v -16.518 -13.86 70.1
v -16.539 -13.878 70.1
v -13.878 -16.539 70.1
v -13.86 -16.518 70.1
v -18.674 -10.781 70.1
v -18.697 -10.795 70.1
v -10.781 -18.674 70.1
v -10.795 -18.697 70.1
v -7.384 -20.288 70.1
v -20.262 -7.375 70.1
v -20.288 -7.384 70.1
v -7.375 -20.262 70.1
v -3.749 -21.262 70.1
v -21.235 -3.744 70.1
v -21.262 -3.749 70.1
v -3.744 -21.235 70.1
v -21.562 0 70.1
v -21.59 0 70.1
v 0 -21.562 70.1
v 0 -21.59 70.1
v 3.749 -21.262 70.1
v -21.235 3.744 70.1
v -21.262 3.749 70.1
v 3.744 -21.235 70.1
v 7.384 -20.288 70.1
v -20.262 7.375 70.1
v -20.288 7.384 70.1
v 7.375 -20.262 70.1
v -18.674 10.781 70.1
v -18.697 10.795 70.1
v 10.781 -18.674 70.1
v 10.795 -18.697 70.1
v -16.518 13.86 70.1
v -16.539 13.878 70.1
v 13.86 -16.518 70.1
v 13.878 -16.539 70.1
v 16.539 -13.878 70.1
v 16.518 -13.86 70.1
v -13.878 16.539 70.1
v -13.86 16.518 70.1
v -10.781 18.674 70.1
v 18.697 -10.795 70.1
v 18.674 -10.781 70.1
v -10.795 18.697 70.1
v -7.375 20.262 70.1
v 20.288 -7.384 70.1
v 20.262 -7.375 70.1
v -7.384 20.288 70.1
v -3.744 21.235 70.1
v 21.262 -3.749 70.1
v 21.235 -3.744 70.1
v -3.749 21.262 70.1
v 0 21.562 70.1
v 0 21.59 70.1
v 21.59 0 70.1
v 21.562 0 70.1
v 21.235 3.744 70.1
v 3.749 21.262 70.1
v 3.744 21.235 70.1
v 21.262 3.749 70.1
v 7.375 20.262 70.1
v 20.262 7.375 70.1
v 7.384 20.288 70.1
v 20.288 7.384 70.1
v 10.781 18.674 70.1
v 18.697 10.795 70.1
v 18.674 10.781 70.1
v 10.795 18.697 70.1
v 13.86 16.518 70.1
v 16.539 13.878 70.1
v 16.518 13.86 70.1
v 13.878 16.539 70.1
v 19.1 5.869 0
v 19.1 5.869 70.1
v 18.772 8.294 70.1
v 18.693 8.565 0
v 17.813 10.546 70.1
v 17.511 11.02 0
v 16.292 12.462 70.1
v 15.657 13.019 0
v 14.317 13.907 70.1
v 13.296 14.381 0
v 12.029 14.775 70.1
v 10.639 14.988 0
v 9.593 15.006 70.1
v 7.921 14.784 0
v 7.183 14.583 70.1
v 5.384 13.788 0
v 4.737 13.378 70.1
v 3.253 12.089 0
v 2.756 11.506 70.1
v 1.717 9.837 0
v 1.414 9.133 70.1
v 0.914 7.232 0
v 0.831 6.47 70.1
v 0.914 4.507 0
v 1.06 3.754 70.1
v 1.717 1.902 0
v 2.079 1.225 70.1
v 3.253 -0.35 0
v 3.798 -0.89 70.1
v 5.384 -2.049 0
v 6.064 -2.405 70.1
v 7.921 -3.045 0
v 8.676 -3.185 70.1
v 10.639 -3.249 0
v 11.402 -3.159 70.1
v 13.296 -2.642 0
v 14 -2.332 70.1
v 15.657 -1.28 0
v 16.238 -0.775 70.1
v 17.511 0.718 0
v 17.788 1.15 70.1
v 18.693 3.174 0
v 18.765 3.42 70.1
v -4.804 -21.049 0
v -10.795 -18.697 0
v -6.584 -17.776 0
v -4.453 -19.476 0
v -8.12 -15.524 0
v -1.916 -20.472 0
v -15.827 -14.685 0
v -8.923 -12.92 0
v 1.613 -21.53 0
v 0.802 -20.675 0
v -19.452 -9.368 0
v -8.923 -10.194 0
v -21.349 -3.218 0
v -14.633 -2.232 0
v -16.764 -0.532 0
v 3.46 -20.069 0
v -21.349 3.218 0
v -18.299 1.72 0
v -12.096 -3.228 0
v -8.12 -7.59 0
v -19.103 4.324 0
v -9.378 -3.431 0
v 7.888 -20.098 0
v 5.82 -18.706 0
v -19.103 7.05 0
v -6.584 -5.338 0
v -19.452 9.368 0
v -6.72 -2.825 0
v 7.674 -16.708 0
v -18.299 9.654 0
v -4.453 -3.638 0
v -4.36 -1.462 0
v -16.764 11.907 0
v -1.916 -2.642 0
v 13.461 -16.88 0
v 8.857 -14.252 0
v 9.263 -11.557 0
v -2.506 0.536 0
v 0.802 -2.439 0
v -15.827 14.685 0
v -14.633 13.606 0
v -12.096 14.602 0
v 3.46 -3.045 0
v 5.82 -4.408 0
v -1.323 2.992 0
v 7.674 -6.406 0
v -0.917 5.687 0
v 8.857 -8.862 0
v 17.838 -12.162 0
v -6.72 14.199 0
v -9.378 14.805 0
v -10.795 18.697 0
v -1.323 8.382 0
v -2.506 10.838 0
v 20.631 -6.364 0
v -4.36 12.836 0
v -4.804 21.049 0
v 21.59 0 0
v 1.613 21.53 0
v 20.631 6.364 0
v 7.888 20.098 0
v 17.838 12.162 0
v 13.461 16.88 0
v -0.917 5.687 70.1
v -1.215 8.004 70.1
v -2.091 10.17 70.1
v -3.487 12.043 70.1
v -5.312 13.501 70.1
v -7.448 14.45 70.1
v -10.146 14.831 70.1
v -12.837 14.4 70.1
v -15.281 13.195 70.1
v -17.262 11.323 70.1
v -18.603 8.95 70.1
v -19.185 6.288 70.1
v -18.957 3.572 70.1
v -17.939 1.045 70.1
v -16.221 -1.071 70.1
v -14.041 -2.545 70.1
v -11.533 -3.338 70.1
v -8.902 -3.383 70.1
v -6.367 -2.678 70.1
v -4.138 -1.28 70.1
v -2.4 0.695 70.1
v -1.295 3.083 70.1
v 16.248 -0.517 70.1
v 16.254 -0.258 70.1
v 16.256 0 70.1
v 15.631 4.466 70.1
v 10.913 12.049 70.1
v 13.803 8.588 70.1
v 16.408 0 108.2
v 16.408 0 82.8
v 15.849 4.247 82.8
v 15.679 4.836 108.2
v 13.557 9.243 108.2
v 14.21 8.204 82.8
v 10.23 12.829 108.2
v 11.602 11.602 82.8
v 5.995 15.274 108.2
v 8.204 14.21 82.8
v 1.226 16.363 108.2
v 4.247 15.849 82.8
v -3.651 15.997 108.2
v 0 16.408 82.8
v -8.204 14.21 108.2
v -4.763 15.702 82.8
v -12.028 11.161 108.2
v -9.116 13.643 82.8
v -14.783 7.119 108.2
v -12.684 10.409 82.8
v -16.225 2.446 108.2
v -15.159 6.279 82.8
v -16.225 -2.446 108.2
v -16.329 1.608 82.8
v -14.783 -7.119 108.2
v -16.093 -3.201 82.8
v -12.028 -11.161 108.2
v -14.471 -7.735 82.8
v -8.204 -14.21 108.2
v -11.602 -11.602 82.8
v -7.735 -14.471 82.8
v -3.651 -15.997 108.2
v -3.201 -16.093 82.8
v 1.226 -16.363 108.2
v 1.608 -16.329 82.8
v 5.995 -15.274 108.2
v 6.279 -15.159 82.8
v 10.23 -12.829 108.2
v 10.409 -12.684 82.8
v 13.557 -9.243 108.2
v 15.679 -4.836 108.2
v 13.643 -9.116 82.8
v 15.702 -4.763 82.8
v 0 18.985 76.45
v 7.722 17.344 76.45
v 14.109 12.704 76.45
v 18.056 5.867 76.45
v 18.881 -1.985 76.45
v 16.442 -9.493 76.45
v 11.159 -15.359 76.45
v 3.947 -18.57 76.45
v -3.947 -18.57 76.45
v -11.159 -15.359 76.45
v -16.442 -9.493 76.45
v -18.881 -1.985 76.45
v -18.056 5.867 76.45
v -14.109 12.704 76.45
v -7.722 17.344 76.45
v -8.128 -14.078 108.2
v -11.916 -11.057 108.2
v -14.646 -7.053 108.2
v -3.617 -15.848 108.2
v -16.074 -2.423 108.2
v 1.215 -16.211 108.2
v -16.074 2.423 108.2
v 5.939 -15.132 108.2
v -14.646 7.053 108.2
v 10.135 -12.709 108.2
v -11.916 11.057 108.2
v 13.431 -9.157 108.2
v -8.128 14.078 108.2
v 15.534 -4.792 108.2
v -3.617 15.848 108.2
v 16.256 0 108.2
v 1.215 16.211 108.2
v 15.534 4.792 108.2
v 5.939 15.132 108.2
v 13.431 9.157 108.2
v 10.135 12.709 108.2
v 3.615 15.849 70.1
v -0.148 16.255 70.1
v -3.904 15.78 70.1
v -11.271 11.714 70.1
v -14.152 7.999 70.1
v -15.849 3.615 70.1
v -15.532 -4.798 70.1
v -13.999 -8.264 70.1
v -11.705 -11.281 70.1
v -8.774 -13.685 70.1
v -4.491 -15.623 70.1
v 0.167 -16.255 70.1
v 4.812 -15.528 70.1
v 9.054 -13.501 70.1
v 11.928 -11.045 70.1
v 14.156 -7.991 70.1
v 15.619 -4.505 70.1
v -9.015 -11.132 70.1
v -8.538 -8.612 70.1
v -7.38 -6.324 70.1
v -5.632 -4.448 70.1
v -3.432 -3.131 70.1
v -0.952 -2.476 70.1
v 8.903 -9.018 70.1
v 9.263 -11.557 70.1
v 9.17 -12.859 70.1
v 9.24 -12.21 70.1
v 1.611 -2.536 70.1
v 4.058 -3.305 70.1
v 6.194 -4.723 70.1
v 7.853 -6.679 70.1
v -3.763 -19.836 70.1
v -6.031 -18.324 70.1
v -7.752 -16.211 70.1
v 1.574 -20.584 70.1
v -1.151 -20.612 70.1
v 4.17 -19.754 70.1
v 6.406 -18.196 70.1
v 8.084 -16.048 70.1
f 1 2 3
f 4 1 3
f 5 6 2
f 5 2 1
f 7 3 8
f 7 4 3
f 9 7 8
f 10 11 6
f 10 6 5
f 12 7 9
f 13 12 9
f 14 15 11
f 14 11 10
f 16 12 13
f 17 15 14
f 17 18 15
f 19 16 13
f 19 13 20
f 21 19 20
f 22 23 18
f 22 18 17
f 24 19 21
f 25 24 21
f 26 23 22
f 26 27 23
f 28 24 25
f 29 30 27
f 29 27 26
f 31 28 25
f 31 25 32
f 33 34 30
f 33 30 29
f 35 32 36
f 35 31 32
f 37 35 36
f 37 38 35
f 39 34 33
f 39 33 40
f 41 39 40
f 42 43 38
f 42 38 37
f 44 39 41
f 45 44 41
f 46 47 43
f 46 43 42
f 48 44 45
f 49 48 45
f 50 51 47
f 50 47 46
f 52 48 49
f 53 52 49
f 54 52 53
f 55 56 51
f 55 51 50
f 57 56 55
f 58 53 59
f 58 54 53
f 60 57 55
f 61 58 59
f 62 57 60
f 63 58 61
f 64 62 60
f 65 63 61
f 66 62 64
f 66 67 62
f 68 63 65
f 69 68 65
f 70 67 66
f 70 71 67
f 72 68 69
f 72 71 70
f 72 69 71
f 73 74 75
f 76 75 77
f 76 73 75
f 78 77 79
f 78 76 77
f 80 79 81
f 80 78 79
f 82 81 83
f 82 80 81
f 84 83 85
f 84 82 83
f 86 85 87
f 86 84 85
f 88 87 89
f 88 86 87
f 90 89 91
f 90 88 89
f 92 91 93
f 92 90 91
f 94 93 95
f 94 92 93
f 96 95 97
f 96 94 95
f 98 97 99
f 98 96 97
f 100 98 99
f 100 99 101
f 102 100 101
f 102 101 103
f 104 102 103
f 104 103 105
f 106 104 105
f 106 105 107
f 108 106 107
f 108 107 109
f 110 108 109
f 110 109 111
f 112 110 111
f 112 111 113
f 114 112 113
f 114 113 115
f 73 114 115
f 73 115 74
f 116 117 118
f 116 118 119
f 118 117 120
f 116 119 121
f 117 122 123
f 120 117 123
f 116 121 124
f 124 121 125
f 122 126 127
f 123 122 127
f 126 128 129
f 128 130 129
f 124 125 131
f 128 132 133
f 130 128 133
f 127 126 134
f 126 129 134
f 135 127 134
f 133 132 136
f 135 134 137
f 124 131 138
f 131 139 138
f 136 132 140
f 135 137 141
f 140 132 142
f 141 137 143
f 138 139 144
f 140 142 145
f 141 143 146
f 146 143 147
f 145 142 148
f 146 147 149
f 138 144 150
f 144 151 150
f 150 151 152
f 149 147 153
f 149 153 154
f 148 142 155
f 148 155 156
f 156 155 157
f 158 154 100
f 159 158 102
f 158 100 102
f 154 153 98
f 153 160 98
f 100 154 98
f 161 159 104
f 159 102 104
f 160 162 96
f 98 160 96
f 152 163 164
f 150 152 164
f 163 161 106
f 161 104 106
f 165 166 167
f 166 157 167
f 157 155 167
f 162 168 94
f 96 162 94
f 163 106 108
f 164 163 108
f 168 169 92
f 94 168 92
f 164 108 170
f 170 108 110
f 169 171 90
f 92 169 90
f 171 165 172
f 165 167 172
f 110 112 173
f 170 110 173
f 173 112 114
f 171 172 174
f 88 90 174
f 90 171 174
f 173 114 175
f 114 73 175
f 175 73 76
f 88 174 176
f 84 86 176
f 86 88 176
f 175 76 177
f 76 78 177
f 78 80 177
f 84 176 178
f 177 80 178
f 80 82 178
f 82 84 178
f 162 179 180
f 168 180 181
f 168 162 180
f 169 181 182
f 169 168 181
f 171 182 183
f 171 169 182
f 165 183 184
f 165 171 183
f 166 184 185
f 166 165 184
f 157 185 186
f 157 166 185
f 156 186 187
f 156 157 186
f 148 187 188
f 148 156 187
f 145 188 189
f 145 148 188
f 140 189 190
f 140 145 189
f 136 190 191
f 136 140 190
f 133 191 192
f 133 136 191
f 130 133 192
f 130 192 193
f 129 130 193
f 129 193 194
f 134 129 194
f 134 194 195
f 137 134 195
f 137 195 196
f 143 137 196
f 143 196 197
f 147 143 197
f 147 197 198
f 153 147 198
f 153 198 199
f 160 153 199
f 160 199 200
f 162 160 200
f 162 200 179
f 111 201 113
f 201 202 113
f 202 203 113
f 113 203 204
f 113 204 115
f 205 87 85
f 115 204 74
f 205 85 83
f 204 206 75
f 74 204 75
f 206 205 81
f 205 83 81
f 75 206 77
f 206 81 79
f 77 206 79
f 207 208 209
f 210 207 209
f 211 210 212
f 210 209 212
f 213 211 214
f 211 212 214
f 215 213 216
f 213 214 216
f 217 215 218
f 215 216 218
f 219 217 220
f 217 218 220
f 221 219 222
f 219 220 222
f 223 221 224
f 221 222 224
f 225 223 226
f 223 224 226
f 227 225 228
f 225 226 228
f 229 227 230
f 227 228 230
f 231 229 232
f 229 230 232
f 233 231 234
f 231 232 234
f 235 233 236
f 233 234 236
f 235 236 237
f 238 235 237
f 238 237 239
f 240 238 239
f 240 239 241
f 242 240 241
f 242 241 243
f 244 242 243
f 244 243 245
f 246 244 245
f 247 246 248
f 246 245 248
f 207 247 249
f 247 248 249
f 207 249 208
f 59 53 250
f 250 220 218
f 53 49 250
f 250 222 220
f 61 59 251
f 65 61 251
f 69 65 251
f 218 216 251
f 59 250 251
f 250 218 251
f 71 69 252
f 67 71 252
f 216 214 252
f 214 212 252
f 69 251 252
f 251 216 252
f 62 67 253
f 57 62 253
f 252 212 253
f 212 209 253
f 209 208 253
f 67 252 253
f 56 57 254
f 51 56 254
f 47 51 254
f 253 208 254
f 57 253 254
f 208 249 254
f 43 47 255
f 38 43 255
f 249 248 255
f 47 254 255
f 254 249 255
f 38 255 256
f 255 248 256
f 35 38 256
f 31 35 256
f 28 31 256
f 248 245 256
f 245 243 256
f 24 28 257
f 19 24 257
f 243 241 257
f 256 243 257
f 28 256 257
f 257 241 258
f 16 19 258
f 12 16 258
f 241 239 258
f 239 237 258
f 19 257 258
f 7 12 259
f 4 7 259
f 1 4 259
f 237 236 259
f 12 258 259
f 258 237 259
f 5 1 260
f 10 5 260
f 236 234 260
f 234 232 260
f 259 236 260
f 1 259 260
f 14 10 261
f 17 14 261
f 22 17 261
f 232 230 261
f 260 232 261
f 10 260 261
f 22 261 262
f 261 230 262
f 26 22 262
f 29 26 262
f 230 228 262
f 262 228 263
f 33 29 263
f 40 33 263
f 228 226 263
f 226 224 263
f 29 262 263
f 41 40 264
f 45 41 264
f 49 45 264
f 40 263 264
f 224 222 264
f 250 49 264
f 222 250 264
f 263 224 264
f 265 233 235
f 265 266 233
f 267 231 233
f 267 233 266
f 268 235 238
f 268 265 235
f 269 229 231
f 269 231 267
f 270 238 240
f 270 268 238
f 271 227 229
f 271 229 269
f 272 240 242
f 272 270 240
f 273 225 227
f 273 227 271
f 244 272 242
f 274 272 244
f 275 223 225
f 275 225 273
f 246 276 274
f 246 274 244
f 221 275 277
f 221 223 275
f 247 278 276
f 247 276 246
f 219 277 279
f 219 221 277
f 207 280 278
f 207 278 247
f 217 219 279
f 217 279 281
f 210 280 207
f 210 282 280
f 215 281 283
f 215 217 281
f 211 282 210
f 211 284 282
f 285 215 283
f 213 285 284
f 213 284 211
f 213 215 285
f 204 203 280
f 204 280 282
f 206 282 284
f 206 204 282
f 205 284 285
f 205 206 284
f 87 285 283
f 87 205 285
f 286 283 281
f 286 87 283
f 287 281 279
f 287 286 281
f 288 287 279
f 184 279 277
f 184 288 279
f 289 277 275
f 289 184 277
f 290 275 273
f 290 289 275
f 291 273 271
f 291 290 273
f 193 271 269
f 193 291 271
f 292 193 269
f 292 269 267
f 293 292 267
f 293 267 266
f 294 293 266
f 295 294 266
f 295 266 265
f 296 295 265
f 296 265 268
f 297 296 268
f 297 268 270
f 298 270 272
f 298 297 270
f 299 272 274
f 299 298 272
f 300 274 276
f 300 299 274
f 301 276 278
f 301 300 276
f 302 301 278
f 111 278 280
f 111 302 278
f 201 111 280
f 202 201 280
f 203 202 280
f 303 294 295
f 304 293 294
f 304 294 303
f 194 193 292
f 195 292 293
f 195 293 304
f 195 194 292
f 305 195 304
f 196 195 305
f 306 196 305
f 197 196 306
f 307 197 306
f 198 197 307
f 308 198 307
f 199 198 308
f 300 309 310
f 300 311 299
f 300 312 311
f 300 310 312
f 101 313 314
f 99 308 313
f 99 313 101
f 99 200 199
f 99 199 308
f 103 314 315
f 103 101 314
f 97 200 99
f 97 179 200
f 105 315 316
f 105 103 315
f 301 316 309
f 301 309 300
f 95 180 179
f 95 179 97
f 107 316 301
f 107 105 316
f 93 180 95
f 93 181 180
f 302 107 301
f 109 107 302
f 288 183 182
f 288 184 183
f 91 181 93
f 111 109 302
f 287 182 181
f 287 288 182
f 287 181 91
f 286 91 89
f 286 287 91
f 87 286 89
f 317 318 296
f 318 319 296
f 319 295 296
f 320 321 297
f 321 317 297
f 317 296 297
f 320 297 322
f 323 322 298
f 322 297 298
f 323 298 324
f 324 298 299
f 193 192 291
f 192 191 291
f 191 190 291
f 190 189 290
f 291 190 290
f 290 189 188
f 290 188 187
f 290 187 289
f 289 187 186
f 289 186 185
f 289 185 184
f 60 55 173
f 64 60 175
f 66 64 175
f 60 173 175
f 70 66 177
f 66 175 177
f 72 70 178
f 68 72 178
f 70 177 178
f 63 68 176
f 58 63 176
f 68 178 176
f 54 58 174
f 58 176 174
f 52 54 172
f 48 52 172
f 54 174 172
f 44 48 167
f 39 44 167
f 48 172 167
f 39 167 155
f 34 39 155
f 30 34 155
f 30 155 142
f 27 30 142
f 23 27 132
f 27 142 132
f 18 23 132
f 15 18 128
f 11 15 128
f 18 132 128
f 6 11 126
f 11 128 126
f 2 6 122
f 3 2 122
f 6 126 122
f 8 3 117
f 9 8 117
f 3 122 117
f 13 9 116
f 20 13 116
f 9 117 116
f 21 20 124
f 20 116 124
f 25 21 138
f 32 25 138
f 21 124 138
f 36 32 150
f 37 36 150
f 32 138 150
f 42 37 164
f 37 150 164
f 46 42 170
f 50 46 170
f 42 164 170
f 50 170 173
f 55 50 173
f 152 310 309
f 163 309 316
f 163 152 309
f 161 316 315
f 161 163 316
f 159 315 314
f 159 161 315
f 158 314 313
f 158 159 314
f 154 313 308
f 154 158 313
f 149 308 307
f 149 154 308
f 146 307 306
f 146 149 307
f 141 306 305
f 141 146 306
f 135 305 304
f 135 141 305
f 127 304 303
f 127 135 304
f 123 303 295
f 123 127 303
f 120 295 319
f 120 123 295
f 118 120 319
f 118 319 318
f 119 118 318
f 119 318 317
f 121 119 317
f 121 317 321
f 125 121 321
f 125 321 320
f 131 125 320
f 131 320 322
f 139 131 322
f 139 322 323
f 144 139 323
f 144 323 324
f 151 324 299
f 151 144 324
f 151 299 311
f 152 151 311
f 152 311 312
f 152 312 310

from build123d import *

# Parameters (mm, degrees)
SKETCH1_R           = 21.59
SKETCH1_R_2         = 9.144
BOSS_EXTRUDE1_DEPTH = 70.1
SKETCH2_R           = 16.4084
SKETCH2_R_2         = 16.256
BOSS_EXTRUDE2_DEPTH = 38.1


with BuildPart() as part:
    # Sketch1 → Boss-Extrude1 (new body)
    with BuildSketch(Plane.XY):
        Circle(SKETCH1_R)
        with Locations((0.118855304, -11.557)):
            Circle(SKETCH1_R_2, mode=Mode.SUBTRACT)
        with Locations((9.955579479, 5.869470694)):
            Circle(SKETCH1_R_2, mode=Mode.SUBTRACT)
        with Locations((-10.060900468, 5.687049391)):
            Circle(SKETCH1_R_2, mode=Mode.SUBTRACT)
    extrude(amount=BOSS_EXTRUDE1_DEPTH)

    # Sketch2 → Boss-Extrude2 (add)
    with BuildSketch(Plane.XY.offset(70.1)):
        Circle(SKETCH2_R)
        Circle(SKETCH2_R_2, mode=Mode.SUBTRACT)
    extrude(amount=BOSS_EXTRUDE2_DEPTH)

    # Sketch8 → Revolve3 (revolve)
    with BuildSketch(Plane(origin=(0, 0, 0), x_dir=(0, 0, -1), z_dir=(1, 0, 0))):
        Polygon((-70.1, 21.56234654), (-82.8, 16.4084), (-70.1, 16.4084), align=None)
    revolve(axis=Axis((0, 0, 126.159811209), (0, 0, -1)))


solid = part.part
